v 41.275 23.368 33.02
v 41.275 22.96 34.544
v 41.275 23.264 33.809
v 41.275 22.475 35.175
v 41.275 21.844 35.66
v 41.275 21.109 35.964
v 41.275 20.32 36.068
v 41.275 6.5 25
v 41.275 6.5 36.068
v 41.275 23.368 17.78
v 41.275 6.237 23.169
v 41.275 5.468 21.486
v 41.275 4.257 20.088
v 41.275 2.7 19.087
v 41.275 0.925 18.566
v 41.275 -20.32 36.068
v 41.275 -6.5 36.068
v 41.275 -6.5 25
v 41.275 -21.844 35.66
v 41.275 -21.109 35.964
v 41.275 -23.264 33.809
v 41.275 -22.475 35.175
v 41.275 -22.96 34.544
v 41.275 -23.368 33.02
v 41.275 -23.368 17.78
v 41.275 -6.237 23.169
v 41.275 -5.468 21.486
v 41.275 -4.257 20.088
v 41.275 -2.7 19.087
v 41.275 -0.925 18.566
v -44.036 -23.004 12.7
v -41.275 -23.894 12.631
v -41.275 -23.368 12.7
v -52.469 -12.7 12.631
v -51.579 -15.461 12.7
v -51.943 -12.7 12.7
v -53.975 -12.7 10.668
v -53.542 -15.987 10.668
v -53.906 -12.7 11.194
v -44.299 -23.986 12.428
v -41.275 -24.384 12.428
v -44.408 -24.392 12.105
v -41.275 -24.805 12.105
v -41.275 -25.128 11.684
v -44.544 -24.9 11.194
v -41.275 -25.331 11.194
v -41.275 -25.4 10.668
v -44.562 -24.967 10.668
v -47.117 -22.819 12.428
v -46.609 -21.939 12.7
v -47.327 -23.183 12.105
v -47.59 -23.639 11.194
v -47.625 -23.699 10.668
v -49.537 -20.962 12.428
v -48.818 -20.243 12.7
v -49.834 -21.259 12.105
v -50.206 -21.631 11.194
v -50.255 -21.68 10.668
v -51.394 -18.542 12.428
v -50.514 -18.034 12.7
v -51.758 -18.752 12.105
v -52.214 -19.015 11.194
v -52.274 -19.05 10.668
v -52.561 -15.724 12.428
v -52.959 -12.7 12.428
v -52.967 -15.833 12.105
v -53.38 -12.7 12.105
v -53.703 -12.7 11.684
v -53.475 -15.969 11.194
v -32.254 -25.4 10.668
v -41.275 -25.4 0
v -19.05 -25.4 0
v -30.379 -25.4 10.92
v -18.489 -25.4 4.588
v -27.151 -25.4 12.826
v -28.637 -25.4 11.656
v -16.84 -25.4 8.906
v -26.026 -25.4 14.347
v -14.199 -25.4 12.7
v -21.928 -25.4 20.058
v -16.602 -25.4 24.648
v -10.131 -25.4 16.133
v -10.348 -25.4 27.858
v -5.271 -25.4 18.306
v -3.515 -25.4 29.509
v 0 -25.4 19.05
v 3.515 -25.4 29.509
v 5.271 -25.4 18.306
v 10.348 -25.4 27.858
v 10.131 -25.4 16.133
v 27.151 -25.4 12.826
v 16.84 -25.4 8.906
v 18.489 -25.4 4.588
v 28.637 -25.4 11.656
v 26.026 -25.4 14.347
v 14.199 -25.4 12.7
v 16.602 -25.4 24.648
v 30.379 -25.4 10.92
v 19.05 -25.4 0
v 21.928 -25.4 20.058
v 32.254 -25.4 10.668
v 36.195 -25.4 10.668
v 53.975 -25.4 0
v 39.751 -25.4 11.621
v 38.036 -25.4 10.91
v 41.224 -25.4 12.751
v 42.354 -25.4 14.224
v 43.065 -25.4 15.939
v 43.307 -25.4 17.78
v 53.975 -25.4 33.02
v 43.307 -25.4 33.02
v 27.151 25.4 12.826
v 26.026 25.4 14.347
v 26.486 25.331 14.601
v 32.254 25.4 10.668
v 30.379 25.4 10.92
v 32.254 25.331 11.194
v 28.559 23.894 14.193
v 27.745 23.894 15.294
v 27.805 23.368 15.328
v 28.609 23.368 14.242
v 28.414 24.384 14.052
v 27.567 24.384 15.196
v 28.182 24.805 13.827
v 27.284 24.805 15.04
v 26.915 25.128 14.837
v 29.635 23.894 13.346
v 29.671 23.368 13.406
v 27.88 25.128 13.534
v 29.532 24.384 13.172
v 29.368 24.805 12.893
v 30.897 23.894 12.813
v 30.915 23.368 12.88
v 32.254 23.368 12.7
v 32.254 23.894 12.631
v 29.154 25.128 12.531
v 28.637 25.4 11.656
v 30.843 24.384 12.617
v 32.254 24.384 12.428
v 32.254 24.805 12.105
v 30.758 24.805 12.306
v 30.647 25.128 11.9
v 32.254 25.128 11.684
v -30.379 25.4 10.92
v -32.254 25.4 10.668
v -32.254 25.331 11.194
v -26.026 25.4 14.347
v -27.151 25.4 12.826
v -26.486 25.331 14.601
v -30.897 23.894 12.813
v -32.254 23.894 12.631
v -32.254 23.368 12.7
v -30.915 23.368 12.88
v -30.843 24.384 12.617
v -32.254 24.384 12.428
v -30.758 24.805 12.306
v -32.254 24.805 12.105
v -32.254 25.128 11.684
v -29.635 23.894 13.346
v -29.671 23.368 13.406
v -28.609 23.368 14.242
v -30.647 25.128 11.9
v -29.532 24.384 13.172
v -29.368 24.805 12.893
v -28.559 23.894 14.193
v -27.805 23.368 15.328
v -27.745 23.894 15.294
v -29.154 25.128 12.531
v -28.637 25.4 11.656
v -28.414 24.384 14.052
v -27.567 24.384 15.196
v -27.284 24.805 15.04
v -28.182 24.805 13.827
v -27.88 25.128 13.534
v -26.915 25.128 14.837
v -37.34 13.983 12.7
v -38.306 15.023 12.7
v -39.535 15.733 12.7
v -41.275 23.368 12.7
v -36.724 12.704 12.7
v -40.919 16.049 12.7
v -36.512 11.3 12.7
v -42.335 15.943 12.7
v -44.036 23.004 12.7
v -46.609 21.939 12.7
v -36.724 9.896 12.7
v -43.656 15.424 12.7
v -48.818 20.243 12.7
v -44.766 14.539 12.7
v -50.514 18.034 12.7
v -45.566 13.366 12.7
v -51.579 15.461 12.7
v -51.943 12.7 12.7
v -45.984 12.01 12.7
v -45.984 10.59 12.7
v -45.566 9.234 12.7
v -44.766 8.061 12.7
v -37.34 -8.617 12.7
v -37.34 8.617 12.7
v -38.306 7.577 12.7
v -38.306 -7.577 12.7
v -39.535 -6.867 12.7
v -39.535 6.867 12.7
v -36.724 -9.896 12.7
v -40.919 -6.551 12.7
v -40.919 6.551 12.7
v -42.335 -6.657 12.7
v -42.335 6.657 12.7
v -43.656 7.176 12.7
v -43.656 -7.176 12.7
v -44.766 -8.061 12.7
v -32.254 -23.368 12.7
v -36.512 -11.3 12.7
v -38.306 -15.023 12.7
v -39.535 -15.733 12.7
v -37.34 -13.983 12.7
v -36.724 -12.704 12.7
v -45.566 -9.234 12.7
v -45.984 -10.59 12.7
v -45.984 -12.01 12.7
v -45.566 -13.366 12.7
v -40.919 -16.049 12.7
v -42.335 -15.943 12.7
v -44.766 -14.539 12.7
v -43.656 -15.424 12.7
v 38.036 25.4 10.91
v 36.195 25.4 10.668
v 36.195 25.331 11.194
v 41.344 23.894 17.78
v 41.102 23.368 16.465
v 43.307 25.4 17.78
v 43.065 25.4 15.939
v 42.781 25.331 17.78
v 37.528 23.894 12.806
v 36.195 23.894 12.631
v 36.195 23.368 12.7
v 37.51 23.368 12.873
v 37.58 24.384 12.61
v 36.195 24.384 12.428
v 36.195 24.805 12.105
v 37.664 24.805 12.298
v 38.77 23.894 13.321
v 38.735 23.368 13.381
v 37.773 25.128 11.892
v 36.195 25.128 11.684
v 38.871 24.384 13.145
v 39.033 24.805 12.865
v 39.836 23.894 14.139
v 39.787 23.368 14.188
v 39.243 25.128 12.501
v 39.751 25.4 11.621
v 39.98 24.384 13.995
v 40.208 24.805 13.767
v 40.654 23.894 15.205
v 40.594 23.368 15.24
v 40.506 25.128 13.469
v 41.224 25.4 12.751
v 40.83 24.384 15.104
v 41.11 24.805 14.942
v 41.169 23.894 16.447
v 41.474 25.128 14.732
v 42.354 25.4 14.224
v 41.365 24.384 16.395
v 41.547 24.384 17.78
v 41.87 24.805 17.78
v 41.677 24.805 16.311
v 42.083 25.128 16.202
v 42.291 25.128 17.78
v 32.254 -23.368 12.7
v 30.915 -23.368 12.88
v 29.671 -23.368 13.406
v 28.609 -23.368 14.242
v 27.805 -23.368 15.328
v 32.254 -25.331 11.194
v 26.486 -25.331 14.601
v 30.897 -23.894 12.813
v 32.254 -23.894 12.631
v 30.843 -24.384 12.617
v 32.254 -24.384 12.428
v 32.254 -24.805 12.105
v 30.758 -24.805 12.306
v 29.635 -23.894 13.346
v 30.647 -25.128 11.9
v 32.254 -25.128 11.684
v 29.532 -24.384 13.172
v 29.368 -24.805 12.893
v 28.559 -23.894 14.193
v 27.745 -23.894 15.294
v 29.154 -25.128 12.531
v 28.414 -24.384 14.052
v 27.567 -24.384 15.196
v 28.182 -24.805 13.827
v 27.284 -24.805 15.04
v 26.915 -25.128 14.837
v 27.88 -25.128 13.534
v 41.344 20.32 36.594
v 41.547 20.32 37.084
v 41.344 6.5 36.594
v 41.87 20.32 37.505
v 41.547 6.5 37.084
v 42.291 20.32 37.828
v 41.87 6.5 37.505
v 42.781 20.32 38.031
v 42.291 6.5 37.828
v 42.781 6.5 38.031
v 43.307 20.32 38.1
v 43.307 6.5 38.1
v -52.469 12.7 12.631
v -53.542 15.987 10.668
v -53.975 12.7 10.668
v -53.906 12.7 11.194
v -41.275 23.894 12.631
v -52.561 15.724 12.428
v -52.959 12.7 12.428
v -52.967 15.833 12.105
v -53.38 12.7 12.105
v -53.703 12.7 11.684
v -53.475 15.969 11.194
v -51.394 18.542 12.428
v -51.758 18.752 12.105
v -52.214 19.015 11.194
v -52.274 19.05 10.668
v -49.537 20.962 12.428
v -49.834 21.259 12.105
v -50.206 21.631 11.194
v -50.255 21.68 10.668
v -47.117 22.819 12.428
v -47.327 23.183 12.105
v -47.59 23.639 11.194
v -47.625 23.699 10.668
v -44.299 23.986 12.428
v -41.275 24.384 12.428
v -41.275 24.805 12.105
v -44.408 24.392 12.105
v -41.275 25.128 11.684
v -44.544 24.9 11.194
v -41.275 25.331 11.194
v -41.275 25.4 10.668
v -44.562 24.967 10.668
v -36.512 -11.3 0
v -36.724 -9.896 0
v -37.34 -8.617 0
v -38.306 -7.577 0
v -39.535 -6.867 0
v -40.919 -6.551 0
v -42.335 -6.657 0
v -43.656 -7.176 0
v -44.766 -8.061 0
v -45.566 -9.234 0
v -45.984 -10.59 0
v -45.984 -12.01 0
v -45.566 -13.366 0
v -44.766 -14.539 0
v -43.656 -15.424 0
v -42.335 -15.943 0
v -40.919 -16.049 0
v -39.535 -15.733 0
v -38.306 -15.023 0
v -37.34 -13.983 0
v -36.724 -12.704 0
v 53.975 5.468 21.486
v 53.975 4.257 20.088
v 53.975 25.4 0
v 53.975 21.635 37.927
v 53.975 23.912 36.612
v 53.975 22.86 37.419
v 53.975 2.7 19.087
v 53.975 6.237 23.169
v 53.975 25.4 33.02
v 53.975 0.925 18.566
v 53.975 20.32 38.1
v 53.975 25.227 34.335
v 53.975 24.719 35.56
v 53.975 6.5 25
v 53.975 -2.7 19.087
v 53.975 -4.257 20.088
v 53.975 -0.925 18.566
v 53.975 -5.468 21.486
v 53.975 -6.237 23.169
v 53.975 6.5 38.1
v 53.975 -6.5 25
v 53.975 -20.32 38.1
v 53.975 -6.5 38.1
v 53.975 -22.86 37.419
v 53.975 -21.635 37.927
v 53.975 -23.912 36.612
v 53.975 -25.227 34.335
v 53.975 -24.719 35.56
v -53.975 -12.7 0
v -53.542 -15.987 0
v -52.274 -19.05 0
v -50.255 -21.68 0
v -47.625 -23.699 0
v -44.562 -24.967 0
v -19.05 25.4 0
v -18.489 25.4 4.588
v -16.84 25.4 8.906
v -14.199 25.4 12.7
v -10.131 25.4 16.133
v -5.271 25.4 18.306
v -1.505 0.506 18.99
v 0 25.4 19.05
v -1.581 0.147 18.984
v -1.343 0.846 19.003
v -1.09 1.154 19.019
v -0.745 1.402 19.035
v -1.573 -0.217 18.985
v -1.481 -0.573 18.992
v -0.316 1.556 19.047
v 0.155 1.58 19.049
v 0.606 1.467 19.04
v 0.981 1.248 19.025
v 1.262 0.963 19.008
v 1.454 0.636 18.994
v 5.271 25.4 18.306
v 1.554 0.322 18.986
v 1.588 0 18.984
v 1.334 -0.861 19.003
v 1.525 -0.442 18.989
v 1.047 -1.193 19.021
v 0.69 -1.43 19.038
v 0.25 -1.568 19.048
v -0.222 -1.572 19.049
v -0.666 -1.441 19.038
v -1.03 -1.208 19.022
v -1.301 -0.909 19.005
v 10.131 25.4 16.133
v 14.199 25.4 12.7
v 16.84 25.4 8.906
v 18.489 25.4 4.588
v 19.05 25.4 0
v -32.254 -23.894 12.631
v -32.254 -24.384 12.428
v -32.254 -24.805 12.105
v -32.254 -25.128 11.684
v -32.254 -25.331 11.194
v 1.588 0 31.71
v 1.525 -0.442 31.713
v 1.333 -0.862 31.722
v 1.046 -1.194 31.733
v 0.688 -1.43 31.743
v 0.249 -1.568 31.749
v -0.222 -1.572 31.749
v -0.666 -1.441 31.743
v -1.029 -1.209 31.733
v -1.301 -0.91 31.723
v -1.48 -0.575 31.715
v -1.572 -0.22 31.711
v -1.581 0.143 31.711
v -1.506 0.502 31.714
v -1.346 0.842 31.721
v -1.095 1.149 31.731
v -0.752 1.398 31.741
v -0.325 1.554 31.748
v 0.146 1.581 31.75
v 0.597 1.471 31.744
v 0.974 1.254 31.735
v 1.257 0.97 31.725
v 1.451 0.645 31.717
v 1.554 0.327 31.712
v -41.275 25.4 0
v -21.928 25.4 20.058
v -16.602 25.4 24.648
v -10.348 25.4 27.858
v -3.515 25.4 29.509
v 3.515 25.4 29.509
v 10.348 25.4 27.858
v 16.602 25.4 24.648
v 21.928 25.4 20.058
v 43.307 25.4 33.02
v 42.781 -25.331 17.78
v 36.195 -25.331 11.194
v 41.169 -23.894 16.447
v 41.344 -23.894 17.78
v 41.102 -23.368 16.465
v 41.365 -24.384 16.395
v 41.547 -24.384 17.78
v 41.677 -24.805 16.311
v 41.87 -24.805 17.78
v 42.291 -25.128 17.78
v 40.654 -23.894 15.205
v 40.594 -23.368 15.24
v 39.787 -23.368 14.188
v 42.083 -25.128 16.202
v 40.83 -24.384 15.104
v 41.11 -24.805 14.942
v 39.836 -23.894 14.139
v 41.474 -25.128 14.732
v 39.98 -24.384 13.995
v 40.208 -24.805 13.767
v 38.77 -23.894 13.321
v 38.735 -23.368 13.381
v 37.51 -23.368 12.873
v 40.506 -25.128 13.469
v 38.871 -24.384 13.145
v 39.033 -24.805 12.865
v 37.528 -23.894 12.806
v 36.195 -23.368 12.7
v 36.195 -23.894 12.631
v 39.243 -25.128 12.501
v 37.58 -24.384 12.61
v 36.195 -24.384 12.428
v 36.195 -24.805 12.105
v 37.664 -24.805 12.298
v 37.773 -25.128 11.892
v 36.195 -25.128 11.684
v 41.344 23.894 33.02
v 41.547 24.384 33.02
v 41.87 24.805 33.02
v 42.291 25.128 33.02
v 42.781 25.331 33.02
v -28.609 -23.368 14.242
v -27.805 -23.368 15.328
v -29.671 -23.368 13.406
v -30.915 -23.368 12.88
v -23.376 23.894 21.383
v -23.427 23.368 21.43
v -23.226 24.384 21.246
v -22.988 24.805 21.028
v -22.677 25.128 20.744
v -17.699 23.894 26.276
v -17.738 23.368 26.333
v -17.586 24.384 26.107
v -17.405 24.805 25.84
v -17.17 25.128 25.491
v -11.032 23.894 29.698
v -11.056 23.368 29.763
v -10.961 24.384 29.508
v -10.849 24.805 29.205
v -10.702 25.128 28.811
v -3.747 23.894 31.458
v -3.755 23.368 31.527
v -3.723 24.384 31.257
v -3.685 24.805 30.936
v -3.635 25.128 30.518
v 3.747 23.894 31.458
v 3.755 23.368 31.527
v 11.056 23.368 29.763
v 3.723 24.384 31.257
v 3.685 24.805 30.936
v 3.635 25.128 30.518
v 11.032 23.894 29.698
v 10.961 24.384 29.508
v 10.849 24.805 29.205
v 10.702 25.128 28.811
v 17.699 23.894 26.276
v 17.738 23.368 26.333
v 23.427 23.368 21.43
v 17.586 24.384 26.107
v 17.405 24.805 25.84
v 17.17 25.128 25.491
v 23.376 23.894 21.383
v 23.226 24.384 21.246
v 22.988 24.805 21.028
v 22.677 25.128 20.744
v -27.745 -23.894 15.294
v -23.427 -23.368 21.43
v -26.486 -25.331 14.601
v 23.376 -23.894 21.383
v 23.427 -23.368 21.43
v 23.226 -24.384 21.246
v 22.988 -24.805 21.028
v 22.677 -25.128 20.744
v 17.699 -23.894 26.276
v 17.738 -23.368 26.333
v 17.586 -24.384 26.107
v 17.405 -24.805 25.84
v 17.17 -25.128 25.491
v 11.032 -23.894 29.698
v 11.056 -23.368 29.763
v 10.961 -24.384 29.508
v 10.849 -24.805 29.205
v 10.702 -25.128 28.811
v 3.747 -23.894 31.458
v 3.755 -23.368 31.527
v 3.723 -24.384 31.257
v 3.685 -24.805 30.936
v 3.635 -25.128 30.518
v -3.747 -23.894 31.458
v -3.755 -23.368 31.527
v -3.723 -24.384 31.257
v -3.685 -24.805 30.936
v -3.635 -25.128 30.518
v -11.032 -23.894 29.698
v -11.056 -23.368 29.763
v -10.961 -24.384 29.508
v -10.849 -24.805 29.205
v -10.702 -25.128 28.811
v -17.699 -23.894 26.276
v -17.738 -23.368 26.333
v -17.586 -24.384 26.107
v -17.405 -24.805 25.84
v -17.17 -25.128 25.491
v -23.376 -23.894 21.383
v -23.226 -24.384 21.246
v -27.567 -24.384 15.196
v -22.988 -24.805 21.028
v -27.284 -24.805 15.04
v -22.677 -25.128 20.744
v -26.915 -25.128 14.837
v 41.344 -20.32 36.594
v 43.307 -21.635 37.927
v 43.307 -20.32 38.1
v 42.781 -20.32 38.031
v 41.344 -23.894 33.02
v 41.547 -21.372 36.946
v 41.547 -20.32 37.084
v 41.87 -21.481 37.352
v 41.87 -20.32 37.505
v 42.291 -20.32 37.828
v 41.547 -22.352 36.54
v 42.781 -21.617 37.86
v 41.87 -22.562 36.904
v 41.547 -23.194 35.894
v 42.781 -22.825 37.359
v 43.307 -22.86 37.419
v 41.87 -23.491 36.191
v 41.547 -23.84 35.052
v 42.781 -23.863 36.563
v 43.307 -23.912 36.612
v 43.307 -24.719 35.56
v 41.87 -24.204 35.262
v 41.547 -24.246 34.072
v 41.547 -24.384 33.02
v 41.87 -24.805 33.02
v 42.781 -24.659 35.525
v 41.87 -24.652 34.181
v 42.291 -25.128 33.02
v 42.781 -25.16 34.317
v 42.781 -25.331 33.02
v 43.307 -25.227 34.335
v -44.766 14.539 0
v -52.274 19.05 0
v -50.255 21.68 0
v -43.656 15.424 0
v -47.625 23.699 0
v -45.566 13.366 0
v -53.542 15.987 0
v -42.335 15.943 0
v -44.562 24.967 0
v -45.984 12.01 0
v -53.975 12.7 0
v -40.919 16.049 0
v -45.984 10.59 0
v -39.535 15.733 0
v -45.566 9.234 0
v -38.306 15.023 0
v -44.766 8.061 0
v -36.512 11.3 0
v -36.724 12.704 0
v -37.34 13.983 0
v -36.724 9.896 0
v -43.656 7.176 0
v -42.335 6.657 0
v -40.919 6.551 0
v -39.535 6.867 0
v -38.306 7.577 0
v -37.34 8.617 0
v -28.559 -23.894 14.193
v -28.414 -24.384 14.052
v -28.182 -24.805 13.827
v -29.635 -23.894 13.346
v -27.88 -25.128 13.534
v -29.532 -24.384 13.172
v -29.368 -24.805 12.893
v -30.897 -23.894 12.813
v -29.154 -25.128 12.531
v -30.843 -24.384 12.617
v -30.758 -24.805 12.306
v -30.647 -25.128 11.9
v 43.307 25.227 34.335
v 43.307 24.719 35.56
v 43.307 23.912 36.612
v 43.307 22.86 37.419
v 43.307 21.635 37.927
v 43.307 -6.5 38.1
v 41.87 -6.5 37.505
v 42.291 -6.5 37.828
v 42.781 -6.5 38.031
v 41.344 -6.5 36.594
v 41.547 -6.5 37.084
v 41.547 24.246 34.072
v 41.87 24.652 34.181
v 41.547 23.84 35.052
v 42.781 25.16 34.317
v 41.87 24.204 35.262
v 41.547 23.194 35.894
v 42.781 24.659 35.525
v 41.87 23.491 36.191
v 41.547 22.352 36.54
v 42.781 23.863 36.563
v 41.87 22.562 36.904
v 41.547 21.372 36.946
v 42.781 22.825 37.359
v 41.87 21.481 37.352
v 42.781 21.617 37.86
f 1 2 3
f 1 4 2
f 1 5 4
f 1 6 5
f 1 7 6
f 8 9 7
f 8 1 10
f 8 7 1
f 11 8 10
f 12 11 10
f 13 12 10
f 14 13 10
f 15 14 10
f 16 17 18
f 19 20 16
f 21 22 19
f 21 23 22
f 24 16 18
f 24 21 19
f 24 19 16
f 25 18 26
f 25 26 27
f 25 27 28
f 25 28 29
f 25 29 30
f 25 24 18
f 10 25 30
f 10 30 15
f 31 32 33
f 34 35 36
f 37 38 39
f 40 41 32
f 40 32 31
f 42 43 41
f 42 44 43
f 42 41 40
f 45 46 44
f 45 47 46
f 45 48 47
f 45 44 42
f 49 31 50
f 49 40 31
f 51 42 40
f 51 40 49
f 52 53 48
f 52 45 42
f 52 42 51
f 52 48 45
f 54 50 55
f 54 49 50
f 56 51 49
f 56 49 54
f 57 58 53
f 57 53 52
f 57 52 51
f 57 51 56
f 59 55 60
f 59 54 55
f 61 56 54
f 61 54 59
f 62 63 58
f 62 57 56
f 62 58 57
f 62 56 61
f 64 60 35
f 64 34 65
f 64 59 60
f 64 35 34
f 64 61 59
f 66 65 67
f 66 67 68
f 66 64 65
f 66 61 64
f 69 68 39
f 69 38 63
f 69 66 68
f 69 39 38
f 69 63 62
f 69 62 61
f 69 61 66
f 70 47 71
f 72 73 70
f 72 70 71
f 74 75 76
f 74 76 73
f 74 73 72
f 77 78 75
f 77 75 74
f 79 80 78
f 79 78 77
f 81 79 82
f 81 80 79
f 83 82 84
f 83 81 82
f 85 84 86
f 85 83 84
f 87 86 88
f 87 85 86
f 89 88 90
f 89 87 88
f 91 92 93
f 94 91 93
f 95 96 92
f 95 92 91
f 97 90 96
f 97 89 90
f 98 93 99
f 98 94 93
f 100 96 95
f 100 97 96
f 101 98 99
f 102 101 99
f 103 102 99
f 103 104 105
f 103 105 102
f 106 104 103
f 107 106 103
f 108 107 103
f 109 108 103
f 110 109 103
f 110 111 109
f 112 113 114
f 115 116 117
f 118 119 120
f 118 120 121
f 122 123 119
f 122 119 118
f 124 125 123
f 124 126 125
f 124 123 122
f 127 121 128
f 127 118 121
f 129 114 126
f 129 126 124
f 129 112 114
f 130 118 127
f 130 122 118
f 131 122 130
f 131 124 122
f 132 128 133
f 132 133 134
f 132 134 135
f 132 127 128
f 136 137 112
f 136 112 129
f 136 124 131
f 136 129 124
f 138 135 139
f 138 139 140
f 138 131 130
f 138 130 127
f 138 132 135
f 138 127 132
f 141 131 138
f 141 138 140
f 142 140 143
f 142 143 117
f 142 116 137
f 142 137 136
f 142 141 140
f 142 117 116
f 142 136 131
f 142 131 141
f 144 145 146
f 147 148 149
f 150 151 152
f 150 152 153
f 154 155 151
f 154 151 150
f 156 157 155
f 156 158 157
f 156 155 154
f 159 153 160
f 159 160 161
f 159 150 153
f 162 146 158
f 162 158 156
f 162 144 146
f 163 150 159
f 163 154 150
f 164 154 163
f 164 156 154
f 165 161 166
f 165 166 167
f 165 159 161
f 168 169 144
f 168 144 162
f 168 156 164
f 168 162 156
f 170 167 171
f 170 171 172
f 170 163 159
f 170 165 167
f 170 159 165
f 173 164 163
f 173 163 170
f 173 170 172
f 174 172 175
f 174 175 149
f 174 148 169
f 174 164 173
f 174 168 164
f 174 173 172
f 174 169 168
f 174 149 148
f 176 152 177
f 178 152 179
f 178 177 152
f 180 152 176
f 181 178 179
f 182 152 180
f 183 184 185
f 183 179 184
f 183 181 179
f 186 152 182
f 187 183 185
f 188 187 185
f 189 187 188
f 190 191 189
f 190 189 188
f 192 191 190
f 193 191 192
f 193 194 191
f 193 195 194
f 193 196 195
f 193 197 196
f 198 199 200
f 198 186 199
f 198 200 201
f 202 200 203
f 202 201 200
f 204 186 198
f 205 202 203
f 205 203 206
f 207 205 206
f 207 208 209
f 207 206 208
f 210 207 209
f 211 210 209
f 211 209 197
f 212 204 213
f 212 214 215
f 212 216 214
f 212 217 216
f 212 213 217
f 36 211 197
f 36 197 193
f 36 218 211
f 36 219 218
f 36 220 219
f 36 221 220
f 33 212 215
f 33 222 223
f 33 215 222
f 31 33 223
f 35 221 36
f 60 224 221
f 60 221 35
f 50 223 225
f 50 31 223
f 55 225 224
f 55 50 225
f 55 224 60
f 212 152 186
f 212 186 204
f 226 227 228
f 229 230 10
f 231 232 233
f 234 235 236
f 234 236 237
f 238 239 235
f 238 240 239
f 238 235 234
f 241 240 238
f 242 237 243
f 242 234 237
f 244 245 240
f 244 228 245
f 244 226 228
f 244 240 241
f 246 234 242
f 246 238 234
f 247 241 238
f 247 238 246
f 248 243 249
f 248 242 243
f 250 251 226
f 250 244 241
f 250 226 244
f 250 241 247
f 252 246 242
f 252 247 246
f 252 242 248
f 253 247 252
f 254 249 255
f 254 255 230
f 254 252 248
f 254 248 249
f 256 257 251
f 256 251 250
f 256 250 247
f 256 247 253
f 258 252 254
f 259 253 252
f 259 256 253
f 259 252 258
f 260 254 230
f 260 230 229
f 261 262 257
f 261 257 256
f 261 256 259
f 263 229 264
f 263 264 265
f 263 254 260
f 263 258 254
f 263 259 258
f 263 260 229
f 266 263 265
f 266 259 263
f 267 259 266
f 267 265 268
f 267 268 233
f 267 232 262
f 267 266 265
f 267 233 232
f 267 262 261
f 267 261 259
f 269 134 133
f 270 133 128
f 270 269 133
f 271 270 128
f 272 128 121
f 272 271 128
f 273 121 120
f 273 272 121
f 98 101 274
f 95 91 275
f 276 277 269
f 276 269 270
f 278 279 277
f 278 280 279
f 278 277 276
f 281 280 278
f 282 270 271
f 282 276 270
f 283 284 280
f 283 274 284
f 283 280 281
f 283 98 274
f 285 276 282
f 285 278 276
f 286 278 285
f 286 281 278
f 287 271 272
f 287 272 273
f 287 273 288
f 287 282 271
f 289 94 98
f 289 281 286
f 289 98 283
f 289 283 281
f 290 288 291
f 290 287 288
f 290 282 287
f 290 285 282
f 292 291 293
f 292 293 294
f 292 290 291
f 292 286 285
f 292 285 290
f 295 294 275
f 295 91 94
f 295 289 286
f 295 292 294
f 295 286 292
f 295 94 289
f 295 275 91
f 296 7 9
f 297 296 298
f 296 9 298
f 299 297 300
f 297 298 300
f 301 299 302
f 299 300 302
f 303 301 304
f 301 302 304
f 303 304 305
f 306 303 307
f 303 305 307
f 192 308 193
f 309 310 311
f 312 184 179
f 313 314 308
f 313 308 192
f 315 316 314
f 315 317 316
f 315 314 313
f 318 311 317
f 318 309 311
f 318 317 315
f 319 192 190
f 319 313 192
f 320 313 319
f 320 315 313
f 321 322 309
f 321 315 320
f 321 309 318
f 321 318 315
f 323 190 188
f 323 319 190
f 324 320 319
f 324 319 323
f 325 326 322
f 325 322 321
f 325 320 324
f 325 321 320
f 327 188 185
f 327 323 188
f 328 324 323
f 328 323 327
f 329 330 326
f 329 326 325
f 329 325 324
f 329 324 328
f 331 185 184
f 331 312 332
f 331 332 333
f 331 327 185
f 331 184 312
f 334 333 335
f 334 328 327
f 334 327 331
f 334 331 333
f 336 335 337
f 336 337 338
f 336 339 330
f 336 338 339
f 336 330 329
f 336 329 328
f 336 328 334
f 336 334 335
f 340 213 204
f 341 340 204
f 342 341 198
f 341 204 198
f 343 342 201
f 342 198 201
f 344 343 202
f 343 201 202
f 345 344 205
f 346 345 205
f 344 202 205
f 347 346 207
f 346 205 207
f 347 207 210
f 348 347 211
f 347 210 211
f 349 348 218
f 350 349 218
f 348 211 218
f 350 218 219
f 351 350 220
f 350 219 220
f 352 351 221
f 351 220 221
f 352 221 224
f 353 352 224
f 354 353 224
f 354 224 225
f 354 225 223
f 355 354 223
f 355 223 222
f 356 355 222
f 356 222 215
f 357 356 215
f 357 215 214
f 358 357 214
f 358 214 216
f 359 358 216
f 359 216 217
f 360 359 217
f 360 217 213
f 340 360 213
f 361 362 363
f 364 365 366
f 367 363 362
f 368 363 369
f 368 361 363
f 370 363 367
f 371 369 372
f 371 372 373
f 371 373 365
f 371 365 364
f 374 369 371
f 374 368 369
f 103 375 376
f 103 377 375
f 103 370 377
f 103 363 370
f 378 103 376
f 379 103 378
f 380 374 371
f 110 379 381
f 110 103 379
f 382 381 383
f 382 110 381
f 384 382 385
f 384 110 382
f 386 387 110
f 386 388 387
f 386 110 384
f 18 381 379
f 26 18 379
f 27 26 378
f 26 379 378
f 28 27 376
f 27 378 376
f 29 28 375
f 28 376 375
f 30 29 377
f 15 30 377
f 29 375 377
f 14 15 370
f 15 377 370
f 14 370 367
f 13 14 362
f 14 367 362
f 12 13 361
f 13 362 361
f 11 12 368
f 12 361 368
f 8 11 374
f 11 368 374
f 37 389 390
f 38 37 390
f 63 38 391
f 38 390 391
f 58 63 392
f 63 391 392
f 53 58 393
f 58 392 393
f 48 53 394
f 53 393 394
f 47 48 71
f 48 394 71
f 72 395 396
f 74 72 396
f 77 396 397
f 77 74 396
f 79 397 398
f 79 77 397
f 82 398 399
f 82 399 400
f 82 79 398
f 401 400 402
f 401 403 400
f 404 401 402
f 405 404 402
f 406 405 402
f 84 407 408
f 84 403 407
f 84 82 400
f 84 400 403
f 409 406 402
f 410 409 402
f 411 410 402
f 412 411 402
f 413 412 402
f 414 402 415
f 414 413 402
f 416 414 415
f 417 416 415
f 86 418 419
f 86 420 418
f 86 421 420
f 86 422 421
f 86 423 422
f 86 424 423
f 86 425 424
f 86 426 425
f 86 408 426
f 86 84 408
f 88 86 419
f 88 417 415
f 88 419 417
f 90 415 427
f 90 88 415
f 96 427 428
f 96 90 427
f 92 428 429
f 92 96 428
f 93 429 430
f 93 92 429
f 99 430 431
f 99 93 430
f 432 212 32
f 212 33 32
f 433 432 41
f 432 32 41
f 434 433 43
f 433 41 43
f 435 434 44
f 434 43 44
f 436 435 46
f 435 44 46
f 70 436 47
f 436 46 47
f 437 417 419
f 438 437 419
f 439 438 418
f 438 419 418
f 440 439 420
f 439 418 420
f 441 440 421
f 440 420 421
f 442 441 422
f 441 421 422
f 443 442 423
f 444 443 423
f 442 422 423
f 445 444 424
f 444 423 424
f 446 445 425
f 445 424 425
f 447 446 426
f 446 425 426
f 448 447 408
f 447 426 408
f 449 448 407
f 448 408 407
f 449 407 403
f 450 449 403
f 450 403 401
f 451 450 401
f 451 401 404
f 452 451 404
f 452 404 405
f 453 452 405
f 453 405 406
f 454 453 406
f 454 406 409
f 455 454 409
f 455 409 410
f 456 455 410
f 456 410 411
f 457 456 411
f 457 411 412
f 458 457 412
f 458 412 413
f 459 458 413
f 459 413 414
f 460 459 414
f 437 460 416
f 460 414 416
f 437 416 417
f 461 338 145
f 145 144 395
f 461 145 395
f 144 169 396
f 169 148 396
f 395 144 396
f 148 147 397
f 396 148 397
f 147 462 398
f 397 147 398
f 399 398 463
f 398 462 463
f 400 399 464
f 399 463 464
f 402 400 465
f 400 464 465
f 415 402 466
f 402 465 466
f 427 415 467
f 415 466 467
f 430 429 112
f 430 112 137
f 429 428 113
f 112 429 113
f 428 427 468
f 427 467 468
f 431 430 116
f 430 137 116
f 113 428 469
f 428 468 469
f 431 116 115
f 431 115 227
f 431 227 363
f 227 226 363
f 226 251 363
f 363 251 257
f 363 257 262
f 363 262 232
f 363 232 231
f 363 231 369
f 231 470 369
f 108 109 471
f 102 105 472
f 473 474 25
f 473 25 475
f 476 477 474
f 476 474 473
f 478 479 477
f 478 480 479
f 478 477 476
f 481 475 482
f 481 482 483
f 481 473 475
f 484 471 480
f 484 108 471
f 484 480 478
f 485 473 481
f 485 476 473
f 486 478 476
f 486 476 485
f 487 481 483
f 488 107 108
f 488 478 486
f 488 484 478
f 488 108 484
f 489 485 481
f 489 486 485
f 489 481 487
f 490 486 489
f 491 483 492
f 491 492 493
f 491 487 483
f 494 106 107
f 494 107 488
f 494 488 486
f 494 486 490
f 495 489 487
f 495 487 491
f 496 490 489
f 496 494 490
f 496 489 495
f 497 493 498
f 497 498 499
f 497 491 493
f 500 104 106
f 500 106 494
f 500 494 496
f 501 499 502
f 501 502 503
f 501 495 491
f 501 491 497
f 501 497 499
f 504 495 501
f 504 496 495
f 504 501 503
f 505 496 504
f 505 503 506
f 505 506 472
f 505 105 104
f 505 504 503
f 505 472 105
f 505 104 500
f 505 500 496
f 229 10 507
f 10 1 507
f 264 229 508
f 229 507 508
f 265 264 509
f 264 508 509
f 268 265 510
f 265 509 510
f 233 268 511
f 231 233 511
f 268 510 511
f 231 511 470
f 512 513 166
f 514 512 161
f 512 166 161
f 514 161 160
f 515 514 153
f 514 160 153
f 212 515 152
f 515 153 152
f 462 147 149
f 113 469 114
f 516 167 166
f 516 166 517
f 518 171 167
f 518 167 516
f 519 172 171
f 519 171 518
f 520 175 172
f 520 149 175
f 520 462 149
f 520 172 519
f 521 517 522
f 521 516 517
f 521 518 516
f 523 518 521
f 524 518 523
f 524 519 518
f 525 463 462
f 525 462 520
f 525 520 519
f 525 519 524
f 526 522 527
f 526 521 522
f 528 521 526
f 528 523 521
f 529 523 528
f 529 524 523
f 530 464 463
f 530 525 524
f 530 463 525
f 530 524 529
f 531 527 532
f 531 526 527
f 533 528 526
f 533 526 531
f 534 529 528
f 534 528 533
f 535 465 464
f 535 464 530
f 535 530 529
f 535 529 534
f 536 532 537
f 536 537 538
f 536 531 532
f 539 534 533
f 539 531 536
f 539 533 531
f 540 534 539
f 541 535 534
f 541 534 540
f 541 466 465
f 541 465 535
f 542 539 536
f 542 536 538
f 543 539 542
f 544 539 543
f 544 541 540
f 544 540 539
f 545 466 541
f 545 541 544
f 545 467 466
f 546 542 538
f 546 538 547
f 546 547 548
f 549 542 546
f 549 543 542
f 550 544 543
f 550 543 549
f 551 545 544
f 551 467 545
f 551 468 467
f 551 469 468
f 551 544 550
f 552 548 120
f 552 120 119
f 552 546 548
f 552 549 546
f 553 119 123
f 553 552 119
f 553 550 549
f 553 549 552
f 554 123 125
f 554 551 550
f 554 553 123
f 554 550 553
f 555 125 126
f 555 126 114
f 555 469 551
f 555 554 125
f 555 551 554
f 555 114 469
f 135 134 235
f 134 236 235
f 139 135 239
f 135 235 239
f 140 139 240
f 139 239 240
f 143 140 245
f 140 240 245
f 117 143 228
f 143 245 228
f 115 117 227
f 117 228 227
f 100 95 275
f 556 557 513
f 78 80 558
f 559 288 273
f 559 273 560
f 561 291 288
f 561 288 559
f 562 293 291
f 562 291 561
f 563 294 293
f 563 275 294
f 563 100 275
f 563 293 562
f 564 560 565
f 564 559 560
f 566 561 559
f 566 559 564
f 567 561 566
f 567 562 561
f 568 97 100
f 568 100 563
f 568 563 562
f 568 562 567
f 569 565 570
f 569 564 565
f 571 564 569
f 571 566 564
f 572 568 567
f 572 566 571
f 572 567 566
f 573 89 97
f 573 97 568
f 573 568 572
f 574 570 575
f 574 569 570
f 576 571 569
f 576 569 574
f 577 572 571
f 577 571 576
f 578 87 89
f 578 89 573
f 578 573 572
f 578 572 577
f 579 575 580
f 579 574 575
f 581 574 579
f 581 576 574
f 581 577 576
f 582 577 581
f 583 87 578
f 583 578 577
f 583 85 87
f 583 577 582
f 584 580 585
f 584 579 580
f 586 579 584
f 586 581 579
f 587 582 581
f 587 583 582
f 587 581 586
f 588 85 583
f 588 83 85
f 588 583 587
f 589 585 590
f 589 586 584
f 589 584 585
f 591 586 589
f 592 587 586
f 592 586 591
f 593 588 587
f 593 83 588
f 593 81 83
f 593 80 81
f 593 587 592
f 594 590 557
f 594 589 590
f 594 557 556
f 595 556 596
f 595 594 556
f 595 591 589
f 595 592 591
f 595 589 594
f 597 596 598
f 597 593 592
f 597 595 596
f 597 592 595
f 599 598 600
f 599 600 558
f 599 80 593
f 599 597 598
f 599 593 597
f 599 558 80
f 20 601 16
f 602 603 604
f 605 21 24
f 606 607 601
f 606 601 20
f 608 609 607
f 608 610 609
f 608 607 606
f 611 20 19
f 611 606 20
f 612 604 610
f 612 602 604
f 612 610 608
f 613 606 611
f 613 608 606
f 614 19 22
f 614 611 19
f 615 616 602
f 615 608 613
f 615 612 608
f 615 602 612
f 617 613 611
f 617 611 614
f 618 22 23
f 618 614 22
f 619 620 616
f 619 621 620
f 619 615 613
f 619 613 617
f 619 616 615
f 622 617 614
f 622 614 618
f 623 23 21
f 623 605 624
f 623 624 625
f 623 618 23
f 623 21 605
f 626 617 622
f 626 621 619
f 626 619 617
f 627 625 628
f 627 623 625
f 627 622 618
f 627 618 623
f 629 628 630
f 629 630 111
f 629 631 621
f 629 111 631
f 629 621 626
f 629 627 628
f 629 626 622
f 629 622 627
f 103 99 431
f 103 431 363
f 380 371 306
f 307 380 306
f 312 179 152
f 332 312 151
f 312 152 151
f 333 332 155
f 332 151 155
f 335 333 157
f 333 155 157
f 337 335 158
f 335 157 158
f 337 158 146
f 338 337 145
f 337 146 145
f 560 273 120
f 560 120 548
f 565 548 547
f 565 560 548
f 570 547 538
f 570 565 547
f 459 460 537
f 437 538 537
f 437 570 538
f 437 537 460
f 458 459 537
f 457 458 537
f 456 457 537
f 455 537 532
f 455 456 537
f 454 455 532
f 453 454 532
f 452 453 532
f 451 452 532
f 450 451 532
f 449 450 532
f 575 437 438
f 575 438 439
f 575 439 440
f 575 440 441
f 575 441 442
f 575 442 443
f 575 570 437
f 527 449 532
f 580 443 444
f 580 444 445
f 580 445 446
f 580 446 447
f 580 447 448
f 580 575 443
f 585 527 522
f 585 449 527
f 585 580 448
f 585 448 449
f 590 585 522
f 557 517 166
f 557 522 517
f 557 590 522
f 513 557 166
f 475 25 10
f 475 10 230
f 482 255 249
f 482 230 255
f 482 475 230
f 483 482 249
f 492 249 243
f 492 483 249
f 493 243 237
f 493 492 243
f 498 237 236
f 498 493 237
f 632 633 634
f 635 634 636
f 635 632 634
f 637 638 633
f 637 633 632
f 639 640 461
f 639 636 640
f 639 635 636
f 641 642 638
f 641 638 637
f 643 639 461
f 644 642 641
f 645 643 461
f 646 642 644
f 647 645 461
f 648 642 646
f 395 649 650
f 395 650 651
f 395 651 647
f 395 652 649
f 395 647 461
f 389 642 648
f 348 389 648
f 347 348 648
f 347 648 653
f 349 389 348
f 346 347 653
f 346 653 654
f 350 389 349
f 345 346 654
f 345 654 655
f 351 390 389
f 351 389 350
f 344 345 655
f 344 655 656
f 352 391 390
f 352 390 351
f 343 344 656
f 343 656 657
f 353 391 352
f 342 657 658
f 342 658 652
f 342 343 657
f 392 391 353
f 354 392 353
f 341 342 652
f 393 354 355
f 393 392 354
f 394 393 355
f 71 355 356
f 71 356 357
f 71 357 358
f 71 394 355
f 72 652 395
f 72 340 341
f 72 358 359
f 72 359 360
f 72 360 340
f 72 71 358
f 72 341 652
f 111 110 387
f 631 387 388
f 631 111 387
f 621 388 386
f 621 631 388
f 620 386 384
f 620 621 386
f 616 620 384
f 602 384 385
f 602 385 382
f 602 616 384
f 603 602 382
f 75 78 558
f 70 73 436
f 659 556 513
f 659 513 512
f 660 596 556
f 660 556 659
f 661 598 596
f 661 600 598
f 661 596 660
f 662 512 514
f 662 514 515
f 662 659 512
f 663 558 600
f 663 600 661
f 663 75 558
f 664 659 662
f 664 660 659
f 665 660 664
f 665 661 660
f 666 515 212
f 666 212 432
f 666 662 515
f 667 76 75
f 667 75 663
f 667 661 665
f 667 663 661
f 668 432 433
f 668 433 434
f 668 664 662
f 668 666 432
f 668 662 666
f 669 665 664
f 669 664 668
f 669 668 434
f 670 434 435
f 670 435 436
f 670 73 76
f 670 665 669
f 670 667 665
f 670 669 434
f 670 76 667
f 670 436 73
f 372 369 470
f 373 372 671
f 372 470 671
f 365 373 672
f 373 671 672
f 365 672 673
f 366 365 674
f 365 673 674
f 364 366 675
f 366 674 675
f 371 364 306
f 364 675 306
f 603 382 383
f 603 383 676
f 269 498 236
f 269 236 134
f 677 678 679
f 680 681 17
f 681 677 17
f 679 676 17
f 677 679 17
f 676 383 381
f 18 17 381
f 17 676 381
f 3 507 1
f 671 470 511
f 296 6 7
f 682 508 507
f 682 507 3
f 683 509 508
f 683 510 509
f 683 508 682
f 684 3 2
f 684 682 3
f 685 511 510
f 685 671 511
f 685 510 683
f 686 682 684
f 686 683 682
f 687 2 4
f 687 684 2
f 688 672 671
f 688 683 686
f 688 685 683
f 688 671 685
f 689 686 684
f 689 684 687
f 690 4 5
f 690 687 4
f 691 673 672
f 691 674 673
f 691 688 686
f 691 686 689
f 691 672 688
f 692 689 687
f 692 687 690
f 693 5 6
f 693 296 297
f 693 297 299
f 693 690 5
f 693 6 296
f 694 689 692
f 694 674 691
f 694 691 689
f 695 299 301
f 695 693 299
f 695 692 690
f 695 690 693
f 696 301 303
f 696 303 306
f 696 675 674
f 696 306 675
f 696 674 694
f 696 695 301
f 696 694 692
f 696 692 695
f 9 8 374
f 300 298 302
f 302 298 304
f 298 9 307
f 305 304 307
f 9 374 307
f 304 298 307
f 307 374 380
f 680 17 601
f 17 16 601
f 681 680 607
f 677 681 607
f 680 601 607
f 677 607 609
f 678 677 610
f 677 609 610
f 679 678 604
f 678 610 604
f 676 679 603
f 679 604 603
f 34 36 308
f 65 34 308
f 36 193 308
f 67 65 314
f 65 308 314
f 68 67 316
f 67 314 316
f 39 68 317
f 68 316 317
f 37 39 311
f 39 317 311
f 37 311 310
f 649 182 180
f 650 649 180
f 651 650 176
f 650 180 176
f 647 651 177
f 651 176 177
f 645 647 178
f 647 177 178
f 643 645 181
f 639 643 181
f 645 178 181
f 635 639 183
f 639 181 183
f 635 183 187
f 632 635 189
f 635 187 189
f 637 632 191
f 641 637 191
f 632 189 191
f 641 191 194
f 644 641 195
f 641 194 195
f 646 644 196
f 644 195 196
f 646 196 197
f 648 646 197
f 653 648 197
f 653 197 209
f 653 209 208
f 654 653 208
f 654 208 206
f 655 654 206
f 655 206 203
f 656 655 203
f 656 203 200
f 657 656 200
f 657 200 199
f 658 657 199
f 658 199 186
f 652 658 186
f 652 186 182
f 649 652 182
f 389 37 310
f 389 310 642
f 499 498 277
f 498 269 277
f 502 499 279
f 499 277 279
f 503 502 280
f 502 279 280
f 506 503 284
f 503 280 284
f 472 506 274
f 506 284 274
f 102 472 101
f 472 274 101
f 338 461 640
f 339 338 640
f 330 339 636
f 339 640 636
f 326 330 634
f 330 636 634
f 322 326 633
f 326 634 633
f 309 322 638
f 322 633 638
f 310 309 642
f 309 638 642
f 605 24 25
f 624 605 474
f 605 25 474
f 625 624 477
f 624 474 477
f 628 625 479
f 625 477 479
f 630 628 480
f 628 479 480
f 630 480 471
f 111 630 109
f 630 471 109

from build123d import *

# Parameters (mm, degrees)
F1_DEPTH = 25.4
F2_R     = 4.7625
F3_DEPTH = 12.701
F5_DEPTH = 12.7
F6_R     = 1.5875
F7_DEPTH = 38.101
F8_R     = 5.08
F9_R     = 12.7
F10_R    = 2.032


with BuildPart() as f1:
    # F0 (on Front) → F1 (new body, symmetric)
    with BuildSketch(Plane.XZ):
        with BuildLine():
            Line((-53.975, 0), (-31.75, 0))
            ThreePointArc((-31.75, 0), (-31.0802754355, 6.4868311871), (-29.099355663, 12.7))
            Line((-29.099355663, 12.7), (-53.975, 12.7))
            Line((-53.975, 12.7), (-53.975, 0))
        make_face()
        with BuildLine():
            ThreePointArc((29.099355663, 12.7), (31.0802754355, 6.4868311871), (31.75, 0))
            Line((31.75, 0), (53.975, 0))
            Line((53.975, 0), (53.975, 38.1))
            Line((53.975, 38.1), (41.275, 38.1))
            Line((41.275, 38.1), (41.275, 12.7))
            Line((41.275, 12.7), (29.099355663, 12.7))
        make_face()
        with BuildLine():
            ThreePointArc((-14.1990316571, 12.7), (0, 19.05), (14.1990316571, 12.7))
            Line((14.1990316571, 12.7), (29.099355663, 12.7))
            ThreePointArc((29.099355663, 12.7), (0, 31.75), (-29.099355663, 12.7))
            Line((-29.099355663, 12.7), (-14.1990316571, 12.7))
        make_face()
        with BuildLine():
            ThreePointArc((14.1990316571, 12.7), (17.7959834382, 6.7974608102), (19.05, 0))
            Line((19.05, 0), (31.75, 0))
            ThreePointArc((31.75, 0), (31.0802754355, 6.4868311871), (29.099355663, 12.7))
            Line((29.099355663, 12.7), (14.1990316571, 12.7))
        make_face()
        with BuildLine():
            Line((-31.75, 0), (-19.05, 0))
            ThreePointArc((-19.05, 0), (-17.7959834382, 6.7974608102), (-14.1990316571, 12.7))
            Line((-14.1990316571, 12.7), (-29.099355663, 12.7))
            ThreePointArc((-29.099355663, 12.7), (-31.0802754355, 6.4868311871), (-31.75, 0))
        make_face()
    extrude(amount=F1_DEPTH, both=True)

    # F2 (on face) → F3 (cut, through all)
    with BuildSketch(Plane.XY.offset(12.7)):
        with Locations((-41.275, 11.3)):
            Circle(F2_R)
        with Locations((-41.275, -11.3)):
            Circle(F2_R)
    extrude(amount=-F3_DEPTH, mode=Mode.SUBTRACT)

    # F4 (on face) → F5 (cut, through all)
    with BuildSketch(Plane.YZ.offset(53.975)):
        with BuildLine():
            Line((6.5, 38.1), (-6.5, 38.1))
            Line((-6.5, 38.1), (-6.5, 25))
            ThreePointArc((-6.5, 25), (0, 31.5), (6.5, 25))
            Line((6.5, 25), (6.5, 38.1))
        make_face()
        with BuildLine():
            ThreePointArc((6.5, 25), (0, 31.5), (-6.5, 25))
            Line((-6.5, 25), (6.5, 25))
        make_face()
        with BuildLine():
            Line((6.5, 25), (-6.5, 25))
            ThreePointArc((-6.5, 25), (0, 18.5), (6.5, 25))
        make_face()
    extrude(amount=-F5_DEPTH, mode=Mode.SUBTRACT)

    # F6 (on face) → F7 (cut, through all)
    with BuildSketch(Plane(origin=(0, 0, 0), x_dir=(1, 0, 0), z_dir=(0, 0, -1))):
        Circle(F6_R)
    extrude(amount=-F7_DEPTH, mode=Mode.SUBTRACT)

    # F8
    f8_edges = [f1.edges().sort_by_distance(p)[0] for p in [
        (47.625, -25.4, 38.1),
        (47.625, 25.4, 38.1),
        (29.099356, 0, 12.7),
        (41.275, 0, 12.7),
        (-29.099356, 0, 12.7),
    ]]
    fillet(f8_edges, radius=F8_R)

    # F9
    f9_edges = [f1.edges().sort_by_distance(p)[0] for p in [
        (-53.975, 25.4, 6.35),
        (-53.975, -25.4, 6.35),
    ]]
    fillet(f9_edges, radius=F9_R)

    # F10
    f10_edges = [f1.edges().sort_by_distance(p)[0] for p in [
        (-36.7645, -25.4, 12.7),
    ]]
    fillet(f10_edges, radius=F10_R)


solid = f1.part
